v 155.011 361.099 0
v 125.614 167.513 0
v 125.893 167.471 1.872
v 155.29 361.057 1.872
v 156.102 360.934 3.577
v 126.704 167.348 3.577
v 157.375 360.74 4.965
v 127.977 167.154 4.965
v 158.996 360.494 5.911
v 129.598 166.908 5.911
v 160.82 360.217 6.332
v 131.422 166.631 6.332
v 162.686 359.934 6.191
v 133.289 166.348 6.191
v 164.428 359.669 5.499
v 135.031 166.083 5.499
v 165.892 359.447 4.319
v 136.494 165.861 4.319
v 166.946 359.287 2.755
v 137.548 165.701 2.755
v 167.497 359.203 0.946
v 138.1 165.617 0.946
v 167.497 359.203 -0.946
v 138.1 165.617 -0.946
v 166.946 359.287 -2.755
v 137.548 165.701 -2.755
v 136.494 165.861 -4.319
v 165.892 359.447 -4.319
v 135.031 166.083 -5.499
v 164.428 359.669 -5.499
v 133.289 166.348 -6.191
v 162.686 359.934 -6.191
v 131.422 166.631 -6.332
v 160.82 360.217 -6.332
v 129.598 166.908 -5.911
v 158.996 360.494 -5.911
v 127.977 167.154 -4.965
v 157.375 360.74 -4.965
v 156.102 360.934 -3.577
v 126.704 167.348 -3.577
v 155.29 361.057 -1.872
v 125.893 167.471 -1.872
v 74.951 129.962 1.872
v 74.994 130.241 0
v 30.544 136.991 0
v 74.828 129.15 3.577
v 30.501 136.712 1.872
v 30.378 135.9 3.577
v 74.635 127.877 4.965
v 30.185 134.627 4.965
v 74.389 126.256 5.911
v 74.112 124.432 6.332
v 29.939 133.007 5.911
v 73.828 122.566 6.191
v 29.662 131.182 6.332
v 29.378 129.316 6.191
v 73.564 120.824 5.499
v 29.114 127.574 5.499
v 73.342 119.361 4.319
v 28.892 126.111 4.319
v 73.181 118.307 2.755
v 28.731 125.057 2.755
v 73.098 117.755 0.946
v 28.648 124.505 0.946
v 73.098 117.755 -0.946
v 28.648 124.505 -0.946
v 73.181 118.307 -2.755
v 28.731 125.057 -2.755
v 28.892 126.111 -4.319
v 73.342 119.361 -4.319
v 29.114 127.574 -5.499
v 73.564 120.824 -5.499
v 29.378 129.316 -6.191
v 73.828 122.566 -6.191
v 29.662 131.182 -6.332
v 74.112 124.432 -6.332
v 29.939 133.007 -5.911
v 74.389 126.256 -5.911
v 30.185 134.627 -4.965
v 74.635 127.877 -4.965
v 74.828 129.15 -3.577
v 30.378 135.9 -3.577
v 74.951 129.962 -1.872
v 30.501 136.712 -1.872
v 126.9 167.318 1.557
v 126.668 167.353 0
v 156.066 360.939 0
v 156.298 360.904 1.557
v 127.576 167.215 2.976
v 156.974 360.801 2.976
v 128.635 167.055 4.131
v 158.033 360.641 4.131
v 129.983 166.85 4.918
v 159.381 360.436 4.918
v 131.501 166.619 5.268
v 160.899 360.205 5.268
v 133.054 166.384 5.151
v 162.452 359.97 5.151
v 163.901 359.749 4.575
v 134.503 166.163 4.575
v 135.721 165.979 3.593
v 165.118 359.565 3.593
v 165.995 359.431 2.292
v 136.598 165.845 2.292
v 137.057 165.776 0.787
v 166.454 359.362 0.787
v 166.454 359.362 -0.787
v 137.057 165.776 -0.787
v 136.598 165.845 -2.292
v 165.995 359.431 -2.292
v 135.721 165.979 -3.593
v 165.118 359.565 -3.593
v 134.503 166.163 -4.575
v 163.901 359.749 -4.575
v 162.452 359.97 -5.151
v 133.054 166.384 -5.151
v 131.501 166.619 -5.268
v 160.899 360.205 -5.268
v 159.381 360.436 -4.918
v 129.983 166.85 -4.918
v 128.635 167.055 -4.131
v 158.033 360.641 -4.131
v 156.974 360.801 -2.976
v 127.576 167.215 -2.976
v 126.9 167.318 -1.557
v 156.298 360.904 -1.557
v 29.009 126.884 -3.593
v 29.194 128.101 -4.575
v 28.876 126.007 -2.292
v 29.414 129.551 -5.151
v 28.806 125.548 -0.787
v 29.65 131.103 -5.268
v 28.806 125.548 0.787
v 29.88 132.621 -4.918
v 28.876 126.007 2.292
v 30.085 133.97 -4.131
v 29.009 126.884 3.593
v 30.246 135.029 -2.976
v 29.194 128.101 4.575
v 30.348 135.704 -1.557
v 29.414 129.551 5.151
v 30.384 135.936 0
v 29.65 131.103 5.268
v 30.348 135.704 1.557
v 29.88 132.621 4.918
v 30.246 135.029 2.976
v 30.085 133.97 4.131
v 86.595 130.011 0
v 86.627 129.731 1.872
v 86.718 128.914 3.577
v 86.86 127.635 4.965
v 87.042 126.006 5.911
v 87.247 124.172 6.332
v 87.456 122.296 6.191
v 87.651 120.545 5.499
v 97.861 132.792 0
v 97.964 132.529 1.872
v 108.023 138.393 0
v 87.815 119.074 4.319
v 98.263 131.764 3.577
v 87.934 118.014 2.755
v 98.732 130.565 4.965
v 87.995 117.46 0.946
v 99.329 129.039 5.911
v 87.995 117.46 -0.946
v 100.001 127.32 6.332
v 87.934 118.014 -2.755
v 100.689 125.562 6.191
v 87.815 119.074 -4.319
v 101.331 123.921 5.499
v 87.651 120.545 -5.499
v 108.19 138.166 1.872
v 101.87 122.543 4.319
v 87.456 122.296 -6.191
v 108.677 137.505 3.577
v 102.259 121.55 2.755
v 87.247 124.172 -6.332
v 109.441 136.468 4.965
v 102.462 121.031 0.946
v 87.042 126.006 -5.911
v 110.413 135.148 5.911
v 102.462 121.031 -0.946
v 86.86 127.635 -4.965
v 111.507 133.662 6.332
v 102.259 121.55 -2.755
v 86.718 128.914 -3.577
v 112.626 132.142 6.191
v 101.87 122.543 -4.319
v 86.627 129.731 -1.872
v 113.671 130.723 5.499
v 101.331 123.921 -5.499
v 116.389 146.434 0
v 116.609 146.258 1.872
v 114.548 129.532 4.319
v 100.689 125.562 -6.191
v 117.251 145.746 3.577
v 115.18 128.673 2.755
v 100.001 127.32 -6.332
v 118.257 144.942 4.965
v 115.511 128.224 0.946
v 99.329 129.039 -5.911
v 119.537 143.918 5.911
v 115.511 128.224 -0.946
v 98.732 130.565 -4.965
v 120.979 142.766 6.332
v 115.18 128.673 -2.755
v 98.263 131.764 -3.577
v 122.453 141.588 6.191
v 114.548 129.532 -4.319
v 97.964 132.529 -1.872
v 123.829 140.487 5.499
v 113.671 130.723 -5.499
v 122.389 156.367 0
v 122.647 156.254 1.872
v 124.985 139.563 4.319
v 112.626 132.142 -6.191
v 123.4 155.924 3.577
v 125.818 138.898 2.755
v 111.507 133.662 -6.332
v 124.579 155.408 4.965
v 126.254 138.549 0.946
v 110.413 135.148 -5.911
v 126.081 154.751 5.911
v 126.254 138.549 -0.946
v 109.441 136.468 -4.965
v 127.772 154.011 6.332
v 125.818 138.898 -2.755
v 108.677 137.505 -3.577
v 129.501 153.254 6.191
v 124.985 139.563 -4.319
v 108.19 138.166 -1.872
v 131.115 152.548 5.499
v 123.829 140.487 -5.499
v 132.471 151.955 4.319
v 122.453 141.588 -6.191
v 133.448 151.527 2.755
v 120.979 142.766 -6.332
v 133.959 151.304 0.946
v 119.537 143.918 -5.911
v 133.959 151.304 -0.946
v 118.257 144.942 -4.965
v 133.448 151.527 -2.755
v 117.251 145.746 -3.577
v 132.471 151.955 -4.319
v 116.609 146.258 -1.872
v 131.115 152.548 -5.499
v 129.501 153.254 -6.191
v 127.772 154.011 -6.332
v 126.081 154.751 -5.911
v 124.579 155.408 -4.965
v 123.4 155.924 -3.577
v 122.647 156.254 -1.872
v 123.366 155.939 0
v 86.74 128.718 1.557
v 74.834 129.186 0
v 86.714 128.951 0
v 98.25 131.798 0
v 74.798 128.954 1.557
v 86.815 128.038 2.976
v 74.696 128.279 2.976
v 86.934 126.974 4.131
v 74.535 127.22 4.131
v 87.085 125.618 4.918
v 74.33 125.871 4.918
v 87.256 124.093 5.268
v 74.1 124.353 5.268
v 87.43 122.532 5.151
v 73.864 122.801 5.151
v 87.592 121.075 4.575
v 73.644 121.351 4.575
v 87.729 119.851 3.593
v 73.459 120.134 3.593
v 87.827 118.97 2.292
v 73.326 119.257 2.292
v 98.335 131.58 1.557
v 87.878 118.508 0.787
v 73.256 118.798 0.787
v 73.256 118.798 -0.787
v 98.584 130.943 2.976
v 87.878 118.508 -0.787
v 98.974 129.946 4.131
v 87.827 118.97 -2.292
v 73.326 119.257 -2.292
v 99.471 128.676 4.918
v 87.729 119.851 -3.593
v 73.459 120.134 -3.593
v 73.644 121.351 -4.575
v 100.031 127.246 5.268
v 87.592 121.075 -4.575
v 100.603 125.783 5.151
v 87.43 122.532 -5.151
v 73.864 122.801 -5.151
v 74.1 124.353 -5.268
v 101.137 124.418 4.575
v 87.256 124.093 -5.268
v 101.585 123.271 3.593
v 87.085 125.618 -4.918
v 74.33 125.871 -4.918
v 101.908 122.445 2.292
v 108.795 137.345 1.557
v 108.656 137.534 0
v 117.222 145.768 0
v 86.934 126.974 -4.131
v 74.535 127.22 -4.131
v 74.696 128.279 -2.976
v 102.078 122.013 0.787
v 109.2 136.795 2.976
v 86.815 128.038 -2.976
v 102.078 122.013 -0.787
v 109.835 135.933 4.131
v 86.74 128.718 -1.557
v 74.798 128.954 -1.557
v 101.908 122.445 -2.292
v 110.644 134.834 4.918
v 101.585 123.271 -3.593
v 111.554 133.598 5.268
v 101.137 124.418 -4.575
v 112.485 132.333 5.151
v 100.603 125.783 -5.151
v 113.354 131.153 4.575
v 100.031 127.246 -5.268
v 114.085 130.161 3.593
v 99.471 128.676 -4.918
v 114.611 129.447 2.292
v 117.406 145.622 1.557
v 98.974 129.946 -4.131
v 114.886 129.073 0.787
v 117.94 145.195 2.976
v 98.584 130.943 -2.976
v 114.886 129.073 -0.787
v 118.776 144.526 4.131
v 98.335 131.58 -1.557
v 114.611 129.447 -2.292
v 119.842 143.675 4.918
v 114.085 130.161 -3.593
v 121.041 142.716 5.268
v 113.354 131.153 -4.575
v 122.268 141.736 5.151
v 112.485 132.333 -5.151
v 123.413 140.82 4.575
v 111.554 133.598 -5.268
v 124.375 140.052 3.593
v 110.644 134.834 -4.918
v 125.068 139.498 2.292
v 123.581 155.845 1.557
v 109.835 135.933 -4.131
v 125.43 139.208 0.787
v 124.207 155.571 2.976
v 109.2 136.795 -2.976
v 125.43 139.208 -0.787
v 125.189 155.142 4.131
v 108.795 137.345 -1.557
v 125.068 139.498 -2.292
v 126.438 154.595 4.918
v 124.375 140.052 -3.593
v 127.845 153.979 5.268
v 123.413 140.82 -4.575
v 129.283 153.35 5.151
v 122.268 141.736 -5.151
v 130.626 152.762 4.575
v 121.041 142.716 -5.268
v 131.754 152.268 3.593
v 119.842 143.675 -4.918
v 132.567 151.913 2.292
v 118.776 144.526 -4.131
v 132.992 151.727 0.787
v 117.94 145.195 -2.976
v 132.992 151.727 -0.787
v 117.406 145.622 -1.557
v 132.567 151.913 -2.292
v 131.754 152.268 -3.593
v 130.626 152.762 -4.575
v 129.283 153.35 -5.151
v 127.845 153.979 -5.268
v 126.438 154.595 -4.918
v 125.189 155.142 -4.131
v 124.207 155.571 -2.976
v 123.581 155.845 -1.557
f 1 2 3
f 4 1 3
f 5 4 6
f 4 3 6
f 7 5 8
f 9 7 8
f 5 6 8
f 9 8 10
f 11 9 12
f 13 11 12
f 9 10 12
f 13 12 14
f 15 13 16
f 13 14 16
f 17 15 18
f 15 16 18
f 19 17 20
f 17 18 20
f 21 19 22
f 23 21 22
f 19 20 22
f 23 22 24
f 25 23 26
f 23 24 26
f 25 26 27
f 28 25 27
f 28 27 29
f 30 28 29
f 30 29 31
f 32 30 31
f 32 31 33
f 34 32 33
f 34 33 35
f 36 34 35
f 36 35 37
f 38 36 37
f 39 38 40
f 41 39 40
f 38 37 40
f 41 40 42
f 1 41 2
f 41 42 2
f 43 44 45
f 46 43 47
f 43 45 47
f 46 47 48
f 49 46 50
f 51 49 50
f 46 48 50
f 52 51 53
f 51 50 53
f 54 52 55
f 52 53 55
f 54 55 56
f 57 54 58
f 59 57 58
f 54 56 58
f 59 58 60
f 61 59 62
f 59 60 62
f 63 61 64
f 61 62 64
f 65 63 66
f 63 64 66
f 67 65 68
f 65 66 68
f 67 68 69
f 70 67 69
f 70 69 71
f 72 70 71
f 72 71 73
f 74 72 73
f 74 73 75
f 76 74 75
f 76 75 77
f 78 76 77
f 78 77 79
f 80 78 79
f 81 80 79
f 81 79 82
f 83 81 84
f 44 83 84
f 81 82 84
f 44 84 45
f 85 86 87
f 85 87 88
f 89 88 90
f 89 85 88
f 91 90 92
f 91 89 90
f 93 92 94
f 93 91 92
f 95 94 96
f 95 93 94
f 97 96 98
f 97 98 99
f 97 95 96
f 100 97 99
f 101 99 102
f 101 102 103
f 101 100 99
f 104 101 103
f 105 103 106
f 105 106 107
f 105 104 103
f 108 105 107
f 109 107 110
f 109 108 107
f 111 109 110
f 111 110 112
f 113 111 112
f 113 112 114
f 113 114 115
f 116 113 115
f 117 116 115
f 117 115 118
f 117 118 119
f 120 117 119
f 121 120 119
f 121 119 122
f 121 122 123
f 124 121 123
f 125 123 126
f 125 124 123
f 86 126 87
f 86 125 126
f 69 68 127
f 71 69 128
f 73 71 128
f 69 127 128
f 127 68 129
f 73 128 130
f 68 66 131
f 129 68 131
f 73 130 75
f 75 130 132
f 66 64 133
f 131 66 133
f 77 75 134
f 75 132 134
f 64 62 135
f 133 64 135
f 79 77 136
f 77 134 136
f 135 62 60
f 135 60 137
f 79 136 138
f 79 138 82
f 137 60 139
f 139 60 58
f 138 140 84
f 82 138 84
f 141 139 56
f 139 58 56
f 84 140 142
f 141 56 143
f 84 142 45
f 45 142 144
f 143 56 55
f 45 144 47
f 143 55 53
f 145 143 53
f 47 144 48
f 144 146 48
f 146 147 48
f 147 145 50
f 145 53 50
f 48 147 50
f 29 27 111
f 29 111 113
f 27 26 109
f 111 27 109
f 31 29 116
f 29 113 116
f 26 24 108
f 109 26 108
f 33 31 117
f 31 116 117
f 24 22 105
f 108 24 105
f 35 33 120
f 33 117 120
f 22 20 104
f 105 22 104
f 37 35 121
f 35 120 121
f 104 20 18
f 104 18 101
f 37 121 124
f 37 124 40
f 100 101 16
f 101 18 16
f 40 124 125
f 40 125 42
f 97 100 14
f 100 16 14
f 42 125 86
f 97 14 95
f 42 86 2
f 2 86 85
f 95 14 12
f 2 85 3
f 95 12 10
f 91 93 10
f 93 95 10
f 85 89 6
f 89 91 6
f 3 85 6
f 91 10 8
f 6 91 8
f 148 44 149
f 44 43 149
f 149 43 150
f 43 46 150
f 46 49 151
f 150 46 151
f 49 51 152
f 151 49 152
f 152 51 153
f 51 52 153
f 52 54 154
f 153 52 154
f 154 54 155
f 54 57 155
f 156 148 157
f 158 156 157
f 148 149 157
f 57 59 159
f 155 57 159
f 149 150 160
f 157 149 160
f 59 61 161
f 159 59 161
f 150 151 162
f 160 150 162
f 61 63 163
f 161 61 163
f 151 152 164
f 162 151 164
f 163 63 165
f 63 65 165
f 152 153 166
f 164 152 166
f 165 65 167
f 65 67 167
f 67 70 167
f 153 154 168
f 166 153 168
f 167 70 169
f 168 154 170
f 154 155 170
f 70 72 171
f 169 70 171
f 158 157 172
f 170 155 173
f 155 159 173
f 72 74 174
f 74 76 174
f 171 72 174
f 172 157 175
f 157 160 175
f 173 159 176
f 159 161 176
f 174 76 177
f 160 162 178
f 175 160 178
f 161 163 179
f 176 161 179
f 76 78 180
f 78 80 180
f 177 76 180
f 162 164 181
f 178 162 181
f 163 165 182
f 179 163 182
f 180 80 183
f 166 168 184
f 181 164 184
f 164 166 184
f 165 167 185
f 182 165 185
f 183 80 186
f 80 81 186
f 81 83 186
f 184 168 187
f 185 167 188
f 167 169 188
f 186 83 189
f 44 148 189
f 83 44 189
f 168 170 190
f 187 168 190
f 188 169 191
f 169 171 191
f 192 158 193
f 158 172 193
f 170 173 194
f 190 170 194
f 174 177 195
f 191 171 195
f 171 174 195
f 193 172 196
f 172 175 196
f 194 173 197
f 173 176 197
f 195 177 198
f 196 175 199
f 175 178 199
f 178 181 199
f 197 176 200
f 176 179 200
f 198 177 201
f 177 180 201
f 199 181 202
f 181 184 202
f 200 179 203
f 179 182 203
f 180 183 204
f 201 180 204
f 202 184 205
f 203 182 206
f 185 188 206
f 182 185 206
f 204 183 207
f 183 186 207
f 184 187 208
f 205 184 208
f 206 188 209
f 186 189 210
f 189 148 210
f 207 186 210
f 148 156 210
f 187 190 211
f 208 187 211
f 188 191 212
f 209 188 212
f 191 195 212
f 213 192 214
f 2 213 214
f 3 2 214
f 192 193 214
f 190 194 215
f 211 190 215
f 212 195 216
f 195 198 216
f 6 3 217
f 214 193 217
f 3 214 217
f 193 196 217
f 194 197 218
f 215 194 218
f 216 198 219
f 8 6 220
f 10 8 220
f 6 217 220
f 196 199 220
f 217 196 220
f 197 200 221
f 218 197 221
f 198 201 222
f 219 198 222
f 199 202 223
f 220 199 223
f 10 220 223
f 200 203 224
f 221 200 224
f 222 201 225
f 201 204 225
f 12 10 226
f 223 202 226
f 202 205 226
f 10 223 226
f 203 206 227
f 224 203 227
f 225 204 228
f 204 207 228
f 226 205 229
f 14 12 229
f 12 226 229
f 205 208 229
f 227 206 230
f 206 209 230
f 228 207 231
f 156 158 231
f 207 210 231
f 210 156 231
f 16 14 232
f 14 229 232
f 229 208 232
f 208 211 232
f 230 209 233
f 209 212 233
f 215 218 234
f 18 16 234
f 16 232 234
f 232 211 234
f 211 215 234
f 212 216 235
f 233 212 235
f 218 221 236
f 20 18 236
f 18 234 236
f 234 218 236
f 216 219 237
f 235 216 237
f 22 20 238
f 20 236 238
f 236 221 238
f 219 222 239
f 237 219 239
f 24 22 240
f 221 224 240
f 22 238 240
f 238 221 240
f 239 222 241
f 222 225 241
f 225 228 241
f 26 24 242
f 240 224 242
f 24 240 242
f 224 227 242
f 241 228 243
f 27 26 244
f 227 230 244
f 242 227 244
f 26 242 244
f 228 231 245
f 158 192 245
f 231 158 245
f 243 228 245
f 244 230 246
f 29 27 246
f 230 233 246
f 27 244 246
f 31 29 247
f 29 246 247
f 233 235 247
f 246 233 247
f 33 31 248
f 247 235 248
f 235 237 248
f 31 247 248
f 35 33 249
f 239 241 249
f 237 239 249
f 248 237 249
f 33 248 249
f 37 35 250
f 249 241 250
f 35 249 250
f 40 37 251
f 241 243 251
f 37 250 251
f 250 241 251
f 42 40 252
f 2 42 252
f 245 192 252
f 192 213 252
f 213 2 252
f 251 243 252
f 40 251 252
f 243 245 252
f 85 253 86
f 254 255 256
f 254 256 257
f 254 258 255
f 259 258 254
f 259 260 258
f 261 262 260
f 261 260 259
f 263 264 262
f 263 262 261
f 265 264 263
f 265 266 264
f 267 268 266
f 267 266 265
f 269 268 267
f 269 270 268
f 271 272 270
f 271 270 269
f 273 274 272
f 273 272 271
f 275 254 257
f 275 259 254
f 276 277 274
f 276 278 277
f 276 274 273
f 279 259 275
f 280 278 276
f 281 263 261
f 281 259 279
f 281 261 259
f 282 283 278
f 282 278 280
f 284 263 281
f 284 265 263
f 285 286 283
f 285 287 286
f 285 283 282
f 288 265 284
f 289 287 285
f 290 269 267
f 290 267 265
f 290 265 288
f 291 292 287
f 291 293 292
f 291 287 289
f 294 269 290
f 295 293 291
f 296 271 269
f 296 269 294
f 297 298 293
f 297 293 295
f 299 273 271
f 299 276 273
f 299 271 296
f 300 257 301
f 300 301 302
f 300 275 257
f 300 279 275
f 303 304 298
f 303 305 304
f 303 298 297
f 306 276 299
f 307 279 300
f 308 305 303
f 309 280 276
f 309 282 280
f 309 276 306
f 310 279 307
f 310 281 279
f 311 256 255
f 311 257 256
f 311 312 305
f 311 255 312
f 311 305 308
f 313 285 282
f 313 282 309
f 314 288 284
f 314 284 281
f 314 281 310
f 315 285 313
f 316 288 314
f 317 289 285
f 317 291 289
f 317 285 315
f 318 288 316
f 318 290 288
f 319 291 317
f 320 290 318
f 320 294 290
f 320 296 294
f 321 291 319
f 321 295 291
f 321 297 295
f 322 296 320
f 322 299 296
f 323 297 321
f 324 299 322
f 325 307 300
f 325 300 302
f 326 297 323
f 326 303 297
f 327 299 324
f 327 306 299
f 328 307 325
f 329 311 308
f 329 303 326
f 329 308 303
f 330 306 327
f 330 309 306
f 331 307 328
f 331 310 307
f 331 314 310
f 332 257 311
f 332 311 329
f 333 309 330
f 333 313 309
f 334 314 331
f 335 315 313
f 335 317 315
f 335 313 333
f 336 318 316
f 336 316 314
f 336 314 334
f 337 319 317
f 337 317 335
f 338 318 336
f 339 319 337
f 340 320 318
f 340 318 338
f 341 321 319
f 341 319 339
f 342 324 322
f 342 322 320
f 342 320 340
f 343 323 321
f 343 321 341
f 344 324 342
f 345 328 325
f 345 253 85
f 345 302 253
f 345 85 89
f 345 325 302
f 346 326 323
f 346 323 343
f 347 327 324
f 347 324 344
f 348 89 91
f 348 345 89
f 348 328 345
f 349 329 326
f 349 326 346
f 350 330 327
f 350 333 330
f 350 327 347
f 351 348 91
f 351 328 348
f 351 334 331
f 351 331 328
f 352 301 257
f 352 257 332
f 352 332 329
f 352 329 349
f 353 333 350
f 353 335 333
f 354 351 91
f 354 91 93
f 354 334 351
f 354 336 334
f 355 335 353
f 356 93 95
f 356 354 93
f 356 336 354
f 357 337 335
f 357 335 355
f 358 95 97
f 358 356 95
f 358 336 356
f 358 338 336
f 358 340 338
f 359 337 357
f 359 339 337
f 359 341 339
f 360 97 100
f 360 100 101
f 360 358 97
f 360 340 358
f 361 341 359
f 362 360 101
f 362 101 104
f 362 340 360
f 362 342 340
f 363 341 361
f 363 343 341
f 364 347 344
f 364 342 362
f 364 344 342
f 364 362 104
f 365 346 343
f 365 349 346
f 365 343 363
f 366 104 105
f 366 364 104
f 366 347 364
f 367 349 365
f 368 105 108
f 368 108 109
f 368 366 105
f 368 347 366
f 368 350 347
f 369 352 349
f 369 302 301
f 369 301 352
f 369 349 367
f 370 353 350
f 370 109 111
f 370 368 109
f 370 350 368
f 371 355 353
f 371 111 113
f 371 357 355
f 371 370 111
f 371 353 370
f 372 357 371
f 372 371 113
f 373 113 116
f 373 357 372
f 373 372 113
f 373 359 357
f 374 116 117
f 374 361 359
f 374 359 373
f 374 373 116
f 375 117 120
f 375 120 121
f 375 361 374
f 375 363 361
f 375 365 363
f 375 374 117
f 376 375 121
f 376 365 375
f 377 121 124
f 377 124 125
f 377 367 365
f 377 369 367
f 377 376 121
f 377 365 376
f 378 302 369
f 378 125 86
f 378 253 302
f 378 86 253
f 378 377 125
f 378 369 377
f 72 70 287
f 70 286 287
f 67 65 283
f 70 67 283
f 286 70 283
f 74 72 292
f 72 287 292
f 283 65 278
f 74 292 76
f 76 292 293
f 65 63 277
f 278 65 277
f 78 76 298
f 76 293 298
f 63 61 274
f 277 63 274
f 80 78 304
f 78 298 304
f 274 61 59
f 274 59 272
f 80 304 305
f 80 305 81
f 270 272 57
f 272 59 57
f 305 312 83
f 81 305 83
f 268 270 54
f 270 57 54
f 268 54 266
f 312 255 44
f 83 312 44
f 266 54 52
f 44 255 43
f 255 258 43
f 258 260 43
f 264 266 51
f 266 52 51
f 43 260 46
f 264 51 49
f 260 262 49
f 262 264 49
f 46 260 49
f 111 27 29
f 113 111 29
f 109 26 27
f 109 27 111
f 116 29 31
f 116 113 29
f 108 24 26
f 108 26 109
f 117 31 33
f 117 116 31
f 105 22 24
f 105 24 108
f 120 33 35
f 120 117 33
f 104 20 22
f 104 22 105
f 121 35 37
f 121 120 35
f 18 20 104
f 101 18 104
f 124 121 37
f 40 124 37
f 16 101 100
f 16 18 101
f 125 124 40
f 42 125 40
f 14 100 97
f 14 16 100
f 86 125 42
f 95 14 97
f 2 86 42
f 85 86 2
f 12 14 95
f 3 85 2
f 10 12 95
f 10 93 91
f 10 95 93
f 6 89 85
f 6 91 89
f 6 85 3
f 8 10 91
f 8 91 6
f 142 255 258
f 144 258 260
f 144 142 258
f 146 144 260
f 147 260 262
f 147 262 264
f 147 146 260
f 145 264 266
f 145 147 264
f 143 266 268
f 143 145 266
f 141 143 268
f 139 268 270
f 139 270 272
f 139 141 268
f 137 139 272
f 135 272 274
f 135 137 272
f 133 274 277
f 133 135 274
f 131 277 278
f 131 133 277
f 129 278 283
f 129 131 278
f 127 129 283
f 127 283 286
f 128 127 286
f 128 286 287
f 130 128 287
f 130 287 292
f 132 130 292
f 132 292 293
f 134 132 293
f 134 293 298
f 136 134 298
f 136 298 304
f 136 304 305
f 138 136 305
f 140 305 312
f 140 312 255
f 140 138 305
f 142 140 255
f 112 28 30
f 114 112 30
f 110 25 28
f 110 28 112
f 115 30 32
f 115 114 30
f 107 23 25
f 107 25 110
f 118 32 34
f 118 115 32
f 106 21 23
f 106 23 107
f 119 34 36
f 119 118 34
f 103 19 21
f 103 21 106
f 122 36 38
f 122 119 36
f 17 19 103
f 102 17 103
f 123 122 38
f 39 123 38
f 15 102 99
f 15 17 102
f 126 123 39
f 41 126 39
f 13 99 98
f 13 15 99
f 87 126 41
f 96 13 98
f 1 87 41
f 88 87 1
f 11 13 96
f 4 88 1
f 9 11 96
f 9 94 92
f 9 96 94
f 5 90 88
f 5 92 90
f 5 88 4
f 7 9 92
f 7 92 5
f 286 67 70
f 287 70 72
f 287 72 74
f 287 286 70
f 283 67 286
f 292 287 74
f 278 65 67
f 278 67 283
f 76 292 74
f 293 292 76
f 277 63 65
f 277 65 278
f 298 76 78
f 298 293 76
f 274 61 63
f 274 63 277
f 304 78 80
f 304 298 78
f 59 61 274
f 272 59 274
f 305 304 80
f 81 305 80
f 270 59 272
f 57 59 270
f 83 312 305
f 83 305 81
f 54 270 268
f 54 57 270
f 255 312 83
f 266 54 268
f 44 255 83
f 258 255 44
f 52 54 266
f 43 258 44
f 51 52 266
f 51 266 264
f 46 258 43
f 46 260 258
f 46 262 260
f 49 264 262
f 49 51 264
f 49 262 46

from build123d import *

# Parameters (mm, degrees)
SKETCH11_R                = 6.35
SKETCH11_R_2              = 5.2832
PIPE_0_5_SCH_40_1_DEPTH   = 44.95961314
SKETCH11_ON_SEGMENT_2_R   = 6.35
SKETCH11_ON_SEGMENT_2_R_2 = 5.2832
PIPE_0_5_SCH_40_1_2_ANGLE = 90
SKETCH11_ON_SEGMENT_3_R   = 6.35
SKETCH11_ON_SEGMENT_3_R_2 = 5.2832
PIPE_0_5_SCH_40_1_3_DEPTH = 195.80541507


with BuildPart() as part:
    # Sketch11 → Pipe 0.5 SCH 40(1) (new body)
    with BuildSketch(Plane(origin=(29.590443683, 130.712980208, 0), x_dir=(0.15013773190138419, 0.9886650906447078, 0), z_dir=(0.9886650906447078, -0.15013773190138419, 0))):
        Circle(SKETCH11_R)
        Circle(SKETCH11_R_2, mode=Mode.SUBTRACT)
    extrude(amount=PIPE_0_5_SCH_40_1_DEPTH)


with BuildPart() as body_2:
    # Sketch11 on segment 2 (carried to the start of arc 2) → Pipe 0.5 SCH 40_1 2 (revolve)
    with BuildSketch(Plane(origin=(74.040443683, 123.962845864, 0), x_dir=(0.150137732, 0.988665091, 0), z_dir=(0.988665091, -0.150137732, 0))):
        Circle(SKETCH11_ON_SEGMENT_2_R)
        Circle(SKETCH11_ON_SEGMENT_2_R_2, mode=Mode.SUBTRACT)
    revolve(axis=Axis((81.667440463, 174.187032469, 0), (0, 0, 1)), revolution_arc=PIPE_0_5_SCH_40_1_2_ANGLE)


with BuildPart() as body_3:
    # Sketch11 on segment 3 (carried to segment 3) → Pipe 0.5 SCH 40_1 3 (new body)
    with BuildSketch(Plane(origin=(131.891627068, 166.560035688, 0), x_dir=(-0.988665091, 0.150137732, 0), z_dir=(0.150137732, 0.988665091, 0))):
        Circle(SKETCH11_ON_SEGMENT_3_R)
        Circle(SKETCH11_ON_SEGMENT_3_R_2, mode=Mode.SUBTRACT)
    extrude(amount=PIPE_0_5_SCH_40_1_3_DEPTH)


solid = Compound([part.part, body_2.part, body_3.part])
